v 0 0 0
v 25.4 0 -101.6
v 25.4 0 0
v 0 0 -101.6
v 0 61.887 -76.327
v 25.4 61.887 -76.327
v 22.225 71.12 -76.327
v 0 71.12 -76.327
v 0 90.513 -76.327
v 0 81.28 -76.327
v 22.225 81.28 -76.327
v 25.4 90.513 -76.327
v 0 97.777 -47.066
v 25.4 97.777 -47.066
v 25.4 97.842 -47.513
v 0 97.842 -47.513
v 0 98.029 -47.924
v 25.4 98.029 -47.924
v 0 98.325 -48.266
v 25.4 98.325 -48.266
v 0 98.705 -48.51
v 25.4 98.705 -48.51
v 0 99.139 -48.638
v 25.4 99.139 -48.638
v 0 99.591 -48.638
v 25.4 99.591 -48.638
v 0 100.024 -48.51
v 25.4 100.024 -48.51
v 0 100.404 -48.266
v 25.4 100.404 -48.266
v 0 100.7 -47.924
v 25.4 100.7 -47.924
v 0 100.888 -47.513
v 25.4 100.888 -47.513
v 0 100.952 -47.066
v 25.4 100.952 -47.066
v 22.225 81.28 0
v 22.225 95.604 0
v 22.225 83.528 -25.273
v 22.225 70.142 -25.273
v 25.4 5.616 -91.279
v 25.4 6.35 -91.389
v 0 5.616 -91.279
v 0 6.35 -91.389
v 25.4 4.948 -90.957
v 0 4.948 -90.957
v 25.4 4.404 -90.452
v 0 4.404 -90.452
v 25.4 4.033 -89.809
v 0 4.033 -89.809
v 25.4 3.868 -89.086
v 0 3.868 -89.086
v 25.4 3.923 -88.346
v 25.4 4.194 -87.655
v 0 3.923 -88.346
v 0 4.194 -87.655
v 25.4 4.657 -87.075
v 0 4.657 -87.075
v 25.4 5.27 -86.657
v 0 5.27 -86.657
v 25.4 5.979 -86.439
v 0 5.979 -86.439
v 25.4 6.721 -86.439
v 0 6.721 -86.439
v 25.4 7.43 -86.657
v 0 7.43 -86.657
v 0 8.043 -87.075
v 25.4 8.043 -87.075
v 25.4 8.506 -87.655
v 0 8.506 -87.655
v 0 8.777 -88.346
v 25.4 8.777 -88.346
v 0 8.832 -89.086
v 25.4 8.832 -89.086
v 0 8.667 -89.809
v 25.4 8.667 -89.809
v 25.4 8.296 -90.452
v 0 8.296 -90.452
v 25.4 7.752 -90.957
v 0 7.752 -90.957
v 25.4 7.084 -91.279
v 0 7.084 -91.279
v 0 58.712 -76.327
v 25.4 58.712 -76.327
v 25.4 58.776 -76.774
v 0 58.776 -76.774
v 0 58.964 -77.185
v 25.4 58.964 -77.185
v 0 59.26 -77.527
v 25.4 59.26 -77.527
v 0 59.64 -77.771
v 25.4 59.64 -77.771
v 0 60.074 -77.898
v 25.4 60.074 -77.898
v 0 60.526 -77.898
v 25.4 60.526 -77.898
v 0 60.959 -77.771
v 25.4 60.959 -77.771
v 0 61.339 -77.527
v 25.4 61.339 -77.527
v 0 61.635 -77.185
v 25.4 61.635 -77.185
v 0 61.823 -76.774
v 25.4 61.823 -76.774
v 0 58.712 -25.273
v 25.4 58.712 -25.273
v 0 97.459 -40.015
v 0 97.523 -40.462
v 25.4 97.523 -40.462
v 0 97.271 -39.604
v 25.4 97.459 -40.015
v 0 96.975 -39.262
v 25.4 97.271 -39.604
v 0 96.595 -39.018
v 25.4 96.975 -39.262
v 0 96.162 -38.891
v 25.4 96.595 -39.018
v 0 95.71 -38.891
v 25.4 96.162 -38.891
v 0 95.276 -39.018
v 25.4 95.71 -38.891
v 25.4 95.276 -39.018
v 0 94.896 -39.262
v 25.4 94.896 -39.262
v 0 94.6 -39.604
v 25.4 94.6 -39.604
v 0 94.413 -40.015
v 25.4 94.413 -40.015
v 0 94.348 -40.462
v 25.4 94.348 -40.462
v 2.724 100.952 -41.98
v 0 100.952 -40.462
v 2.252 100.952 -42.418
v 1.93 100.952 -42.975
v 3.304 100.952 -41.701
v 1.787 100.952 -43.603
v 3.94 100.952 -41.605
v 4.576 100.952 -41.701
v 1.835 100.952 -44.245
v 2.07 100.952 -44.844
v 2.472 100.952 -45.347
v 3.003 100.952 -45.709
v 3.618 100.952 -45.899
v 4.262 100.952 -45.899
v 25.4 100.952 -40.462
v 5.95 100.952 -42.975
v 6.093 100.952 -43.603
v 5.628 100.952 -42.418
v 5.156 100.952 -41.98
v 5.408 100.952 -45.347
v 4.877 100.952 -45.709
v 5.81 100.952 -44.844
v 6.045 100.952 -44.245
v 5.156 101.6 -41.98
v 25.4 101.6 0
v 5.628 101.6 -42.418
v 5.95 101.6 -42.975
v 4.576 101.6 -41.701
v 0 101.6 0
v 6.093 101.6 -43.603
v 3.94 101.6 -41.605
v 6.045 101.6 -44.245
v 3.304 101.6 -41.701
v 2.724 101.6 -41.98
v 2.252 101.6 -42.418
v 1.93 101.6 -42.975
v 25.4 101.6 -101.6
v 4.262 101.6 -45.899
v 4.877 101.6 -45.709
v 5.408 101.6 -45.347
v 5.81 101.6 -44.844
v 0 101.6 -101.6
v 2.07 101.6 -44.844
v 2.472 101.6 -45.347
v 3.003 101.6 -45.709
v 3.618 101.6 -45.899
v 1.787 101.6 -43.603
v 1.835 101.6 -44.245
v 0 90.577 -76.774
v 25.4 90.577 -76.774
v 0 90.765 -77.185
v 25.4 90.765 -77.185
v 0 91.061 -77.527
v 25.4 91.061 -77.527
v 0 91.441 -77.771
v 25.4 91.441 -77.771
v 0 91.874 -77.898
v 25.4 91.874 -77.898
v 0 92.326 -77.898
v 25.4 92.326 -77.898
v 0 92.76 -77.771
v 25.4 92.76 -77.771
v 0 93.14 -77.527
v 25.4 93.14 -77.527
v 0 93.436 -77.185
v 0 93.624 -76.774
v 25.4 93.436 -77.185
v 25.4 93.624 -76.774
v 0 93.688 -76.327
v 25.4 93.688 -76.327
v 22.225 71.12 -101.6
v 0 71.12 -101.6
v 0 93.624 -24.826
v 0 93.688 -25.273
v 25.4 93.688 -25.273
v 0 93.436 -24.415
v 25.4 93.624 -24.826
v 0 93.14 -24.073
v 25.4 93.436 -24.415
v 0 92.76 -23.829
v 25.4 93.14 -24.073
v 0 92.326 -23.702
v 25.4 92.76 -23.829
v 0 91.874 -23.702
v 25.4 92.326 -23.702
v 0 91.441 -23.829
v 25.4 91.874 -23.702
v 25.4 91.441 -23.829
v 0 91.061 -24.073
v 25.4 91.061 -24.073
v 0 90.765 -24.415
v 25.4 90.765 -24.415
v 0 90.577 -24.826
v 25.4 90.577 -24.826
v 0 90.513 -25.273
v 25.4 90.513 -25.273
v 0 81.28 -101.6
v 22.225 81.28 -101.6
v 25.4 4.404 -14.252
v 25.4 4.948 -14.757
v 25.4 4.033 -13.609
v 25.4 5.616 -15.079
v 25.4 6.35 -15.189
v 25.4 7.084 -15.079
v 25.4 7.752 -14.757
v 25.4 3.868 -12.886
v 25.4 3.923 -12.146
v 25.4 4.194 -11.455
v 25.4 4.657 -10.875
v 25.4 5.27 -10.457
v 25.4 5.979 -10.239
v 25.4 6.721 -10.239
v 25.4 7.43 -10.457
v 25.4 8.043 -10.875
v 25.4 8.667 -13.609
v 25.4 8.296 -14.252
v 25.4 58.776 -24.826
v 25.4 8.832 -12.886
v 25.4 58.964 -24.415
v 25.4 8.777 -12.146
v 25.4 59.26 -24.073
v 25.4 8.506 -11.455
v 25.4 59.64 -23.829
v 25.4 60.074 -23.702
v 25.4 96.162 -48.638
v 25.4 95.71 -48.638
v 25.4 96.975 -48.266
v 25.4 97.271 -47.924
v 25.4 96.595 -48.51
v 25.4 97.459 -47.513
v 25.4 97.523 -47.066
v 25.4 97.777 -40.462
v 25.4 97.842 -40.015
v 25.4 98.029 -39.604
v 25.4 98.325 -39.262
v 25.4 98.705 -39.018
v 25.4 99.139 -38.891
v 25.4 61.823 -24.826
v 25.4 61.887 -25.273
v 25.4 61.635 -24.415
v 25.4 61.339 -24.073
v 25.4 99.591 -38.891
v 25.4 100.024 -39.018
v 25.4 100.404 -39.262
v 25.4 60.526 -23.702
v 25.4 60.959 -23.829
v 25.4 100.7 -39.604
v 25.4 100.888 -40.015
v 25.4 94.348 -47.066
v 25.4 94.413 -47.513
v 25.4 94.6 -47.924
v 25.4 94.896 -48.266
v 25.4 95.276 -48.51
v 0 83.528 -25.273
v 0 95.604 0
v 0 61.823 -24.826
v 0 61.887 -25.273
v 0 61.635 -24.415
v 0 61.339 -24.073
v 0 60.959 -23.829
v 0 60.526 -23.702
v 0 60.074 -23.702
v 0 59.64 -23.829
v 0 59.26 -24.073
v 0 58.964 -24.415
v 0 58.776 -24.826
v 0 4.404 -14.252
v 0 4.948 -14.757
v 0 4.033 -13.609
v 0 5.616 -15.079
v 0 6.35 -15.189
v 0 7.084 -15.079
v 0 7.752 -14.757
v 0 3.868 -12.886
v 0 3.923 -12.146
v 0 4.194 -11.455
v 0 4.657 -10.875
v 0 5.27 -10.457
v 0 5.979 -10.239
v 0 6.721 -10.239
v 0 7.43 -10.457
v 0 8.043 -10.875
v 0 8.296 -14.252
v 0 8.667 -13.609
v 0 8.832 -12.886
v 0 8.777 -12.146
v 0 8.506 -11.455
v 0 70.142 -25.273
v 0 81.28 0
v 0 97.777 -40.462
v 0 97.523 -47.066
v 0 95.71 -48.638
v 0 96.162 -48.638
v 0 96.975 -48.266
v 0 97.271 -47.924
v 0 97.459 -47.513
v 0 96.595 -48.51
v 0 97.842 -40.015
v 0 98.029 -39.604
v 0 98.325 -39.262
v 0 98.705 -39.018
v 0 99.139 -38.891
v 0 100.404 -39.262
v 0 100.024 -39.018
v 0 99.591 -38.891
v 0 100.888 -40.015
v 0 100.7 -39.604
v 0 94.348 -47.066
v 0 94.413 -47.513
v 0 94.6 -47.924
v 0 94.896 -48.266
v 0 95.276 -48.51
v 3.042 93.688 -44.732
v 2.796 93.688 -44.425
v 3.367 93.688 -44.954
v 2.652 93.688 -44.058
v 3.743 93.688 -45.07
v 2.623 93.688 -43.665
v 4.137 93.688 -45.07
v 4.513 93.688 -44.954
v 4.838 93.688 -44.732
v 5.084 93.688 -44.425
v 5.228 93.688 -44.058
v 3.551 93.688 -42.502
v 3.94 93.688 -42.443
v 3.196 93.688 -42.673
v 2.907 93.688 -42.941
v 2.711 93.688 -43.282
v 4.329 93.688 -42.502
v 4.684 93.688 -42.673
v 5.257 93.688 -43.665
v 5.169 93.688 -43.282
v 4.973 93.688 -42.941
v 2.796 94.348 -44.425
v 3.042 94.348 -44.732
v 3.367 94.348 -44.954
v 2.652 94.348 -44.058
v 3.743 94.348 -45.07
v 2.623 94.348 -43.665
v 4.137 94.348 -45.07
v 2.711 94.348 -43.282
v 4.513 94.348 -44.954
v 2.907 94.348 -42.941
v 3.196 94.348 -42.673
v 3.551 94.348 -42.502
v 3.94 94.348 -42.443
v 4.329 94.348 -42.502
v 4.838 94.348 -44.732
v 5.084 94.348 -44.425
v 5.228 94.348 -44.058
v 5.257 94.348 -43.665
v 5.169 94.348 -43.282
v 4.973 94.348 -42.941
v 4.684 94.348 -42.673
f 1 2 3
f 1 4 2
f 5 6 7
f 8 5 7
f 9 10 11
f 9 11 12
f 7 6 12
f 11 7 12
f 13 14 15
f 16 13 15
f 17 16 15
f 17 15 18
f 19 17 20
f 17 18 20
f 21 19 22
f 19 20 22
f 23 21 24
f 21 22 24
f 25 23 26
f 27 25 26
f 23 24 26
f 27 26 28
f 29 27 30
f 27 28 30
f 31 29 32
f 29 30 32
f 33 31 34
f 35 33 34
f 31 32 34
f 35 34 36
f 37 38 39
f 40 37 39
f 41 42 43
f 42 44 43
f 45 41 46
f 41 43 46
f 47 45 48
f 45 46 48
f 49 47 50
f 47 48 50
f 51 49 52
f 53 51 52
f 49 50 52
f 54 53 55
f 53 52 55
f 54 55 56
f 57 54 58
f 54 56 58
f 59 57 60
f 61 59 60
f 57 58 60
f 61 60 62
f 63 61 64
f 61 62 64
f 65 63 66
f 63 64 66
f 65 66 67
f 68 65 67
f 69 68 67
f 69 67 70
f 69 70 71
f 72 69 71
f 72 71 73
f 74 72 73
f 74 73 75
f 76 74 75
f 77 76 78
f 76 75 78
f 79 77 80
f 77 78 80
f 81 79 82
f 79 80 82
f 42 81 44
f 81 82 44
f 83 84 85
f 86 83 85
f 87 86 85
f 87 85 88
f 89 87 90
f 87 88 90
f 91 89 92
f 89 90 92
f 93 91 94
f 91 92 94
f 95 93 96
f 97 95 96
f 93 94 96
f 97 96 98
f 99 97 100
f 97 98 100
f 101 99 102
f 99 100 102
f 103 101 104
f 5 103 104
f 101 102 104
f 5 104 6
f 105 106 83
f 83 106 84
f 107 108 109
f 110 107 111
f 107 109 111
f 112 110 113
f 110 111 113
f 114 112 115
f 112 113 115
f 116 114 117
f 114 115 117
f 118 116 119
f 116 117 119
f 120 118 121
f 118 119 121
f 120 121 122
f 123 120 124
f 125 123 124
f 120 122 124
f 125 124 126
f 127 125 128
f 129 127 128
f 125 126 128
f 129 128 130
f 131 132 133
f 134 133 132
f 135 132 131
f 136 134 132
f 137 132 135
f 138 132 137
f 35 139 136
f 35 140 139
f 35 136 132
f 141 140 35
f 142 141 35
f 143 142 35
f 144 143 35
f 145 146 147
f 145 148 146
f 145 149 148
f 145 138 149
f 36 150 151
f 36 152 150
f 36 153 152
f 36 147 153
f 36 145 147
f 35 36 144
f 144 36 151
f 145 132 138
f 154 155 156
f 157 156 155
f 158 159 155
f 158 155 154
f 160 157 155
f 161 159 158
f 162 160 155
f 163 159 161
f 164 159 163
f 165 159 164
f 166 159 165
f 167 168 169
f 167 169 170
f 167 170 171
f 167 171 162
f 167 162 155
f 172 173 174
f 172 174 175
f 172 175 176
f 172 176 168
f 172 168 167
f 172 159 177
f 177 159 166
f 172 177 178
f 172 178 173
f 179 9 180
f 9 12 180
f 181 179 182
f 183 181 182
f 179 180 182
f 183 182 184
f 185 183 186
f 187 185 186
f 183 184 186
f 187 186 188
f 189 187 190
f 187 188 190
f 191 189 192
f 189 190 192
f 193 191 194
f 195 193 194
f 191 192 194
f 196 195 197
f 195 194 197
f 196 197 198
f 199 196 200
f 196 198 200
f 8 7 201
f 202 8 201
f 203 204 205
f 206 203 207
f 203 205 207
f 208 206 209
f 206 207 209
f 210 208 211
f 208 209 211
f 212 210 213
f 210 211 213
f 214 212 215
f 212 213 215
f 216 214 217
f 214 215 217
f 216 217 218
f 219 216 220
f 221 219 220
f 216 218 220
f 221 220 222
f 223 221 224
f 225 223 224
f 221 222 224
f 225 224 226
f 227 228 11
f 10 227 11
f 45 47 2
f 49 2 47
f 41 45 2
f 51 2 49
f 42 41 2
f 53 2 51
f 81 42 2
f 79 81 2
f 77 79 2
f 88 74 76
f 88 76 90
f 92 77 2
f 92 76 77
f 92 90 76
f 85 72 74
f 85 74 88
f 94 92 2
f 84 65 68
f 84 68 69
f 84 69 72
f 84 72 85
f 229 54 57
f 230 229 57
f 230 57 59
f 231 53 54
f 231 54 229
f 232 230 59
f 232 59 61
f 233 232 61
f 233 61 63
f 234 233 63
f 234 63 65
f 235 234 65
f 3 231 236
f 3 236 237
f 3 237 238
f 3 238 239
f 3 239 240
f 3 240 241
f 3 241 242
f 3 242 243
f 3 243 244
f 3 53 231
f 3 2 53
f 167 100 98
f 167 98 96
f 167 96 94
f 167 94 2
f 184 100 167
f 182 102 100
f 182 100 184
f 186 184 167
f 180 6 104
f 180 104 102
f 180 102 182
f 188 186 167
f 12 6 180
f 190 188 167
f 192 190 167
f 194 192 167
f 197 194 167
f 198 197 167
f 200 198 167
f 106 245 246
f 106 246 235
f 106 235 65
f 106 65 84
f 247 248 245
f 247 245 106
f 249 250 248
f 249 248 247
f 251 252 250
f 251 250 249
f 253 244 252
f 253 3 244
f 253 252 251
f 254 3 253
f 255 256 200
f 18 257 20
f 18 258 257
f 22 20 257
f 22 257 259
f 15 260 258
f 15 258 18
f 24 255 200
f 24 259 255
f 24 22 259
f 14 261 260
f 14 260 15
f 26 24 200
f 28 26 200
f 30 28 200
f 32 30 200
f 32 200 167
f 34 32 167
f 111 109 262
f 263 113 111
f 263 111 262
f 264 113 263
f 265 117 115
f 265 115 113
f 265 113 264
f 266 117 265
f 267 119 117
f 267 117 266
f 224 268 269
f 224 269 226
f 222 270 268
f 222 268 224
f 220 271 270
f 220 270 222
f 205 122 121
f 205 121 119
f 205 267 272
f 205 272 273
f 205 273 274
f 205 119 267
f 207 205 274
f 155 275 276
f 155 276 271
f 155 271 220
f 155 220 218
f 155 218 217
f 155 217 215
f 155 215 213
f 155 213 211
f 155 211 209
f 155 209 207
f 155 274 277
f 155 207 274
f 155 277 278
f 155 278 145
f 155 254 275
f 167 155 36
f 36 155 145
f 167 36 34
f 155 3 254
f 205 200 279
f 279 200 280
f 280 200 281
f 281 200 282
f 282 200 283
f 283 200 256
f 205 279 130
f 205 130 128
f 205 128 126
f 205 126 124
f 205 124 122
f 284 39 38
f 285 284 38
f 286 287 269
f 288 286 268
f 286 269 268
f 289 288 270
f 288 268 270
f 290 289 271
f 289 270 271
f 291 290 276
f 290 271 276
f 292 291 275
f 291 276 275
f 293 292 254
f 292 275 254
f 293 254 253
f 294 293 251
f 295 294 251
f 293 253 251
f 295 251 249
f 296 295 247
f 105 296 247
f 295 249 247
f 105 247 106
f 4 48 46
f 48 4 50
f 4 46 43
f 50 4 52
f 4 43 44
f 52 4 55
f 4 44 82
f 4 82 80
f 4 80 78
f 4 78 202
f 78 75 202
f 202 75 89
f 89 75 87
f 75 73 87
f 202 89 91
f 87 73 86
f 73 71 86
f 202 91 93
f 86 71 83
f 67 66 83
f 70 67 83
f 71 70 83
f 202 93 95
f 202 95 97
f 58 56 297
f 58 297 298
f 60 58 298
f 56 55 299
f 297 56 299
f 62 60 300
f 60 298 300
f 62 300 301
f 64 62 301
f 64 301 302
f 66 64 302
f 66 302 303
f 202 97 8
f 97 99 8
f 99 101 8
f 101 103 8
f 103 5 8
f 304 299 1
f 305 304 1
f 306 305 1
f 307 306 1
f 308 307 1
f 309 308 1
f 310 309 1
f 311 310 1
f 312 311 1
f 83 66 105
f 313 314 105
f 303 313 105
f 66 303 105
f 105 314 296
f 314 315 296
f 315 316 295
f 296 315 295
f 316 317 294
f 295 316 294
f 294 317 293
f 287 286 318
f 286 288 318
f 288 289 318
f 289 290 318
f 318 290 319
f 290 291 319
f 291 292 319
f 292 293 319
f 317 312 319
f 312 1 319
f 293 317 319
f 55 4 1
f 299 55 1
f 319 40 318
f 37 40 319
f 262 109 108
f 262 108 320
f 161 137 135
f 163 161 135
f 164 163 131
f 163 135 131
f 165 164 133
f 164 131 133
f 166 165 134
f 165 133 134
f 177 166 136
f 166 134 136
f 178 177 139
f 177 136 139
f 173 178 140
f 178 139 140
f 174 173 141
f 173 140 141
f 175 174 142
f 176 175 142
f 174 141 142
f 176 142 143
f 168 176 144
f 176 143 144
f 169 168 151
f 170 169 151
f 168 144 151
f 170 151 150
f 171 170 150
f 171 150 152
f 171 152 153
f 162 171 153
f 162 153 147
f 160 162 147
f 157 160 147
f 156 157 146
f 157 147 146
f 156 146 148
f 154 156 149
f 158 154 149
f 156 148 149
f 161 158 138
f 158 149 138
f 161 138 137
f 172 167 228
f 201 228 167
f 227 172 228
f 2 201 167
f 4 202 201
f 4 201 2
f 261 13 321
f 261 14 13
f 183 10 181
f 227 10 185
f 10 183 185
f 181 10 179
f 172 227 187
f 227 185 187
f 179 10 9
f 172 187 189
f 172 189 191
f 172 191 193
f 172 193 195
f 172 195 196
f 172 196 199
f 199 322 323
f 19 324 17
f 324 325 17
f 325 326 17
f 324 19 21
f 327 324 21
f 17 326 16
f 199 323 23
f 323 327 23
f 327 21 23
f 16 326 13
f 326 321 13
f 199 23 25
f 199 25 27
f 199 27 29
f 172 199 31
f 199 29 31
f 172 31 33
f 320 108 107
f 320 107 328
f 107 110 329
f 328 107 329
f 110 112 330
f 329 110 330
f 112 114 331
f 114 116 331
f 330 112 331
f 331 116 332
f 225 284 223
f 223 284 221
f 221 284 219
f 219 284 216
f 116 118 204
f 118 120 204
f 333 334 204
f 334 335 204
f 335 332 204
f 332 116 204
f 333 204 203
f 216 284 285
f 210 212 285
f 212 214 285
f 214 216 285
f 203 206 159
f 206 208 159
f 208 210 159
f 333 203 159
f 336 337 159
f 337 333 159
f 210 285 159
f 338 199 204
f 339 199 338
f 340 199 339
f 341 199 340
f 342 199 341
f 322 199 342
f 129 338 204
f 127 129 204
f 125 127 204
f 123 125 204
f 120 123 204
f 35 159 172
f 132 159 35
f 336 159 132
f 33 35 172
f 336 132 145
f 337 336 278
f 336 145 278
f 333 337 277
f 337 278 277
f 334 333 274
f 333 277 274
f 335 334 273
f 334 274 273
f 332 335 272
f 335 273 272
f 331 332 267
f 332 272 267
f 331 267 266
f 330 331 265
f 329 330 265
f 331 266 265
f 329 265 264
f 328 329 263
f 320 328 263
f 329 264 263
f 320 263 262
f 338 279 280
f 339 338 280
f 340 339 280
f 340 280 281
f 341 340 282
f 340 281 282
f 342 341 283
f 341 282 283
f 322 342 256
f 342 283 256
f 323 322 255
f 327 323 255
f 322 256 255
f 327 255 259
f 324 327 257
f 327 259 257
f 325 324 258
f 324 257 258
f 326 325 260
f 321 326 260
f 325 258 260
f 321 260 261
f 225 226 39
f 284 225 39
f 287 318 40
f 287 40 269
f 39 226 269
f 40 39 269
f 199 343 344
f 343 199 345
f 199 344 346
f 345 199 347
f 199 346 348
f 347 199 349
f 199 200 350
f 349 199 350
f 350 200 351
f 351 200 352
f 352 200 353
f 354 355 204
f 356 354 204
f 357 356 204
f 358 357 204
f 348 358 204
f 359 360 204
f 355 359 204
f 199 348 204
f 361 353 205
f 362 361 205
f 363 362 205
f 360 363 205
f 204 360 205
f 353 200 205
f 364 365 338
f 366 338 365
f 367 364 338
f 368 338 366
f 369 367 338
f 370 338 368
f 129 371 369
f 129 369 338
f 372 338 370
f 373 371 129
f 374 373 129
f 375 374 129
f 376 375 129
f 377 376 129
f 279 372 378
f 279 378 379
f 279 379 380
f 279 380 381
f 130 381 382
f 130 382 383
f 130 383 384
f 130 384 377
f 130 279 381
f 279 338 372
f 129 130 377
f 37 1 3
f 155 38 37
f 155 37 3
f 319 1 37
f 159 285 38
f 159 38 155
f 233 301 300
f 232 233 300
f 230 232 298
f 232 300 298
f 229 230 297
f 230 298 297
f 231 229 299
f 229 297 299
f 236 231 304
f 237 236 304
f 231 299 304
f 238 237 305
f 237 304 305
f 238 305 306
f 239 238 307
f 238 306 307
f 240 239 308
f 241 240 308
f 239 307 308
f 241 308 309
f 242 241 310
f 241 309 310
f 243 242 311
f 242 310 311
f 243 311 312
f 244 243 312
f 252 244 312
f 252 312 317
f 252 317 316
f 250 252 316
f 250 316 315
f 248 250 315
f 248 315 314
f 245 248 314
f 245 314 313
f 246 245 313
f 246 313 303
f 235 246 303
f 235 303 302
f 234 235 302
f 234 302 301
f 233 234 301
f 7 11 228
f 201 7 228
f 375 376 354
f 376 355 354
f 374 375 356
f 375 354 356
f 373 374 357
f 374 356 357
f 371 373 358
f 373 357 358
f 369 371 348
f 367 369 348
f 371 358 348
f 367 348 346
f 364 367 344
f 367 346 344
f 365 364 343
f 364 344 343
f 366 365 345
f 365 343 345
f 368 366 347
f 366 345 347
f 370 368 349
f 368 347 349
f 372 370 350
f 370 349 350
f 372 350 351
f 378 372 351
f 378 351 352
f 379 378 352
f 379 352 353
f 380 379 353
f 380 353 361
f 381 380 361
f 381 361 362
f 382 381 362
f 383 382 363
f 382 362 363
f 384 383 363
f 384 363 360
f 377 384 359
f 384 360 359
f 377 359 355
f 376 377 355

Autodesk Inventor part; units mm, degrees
ref_plane "YZ Plane" through (0, 0, 0) normal (1, 0, 0) x (0, 1, 0)
ref_plane "XZ Plane" through (0, 0, 0) normal (0, 1, 0) x (-1, 0, 0)
ref_plane "XY Plane" through (0, 0, 0) normal (0, 0, 1) x (1, 0, 0)
sketch "Sketch1" plane through (0, 0, 0) normal (1, 0, 0) x (0, 1, 0)
  line L0 (0, 0) -> (101.6, 0)
  line L1 (101.6, 0) -> (101.6, -101.6)
  line L2 (101.6, -101.6) -> (0, -101.6)
  line L3 (0, -101.6) -> (0, 0)
  dimension "d0" = 101.6
  dimension "d1" = 101.6
extrude "Extrusion1" add sketch "Sketch1" along normal blind 25.4
sketch "Sketch2" plane through (25.4, 0, 0) normal (1, 0, 0) x (0, 0, -1)
  line L0 (0, 101.6) -> (0, 0) projected
  line L1 (0, 0) -> (12.7, 0)
  line L2 (12.7, 0) -> (12.7, 6.35)
  line L3 (12.7, 6.35) -> (0, 6.35)
  line L4 (0, 6.35) -> (0, 0)
  line L5 (101.6, 0) -> (101.6, 101.6) projected
  line L6 (101.6, 0) -> (88.9, 0)
  line L7 (88.9, 0) -> (88.9, 6.35)
  line L8 (88.9, 6.35) -> (101.6, 6.35)
  line L9 (101.6, 6.35) -> (101.6, 0)
  line L10 (101.6, 101.6) -> (0, 101.6) projected
  line L11 (50.8, 101.6) -> (50.8, 76.2)
  line L12 (25.273, 58.7121) -> (76.327, 58.7121)
  line L13 (76.327, 58.7121) -> (76.327, 93.6879)
  line L14 (76.327, 93.6879) -> (25.273, 93.6879)
  line L15 (25.273, 93.6879) -> (25.273, 58.7121)
  line L16 (25.273, 58.7121) -> (76.327, 93.6879) construction
  line L17 (76.327, 58.7121) -> (25.273, 93.6879) construction
  line L18 (74.9076, 71.12) -> (101.6, 71.12)
  line L19 (101.6, 71.12) -> (101.6, 81.28)
  line L20 (101.6, 81.28) -> (74.9076, 81.28)
  line L21 (74.9076, 81.28) -> (74.9076, 71.12)
  line L22 (74.9076, 71.12) -> (101.6, 81.28) construction
  line L23 (101.6, 71.12) -> (74.9076, 81.28) construction
  line L24 (25.273, 93.6879) -> (25.273, 83.5279)
  line L25 (25.273, 58.7121) -> (25.273, 70.1421)
  line L26 (25.273, 70.1421) -> (0, 81.28)
  line L27 (25.273, 83.5279) -> (0, 95.6039)
  line L28 (0, 81.28) -> (0, 95.6039)
  line L29 (25.273, 83.5279) -> (25.273, 70.1421)
  point P0 (88.2538, 76.2)
  point P1 (76.327, 81.28)
  point P2 (76.327, 71.12)
  dimension "d4" = 12.7
  dimension "d5" = 6.35
  dimension "d6" = 12.7
  dimension "d7" = 6.35
  dimension "d8" = 25.4
  dimension "d9" = 51.054
  dimension "d10" = 34.9758
  dimension "d20" = 10.16
  dimension "d21" = 10.16
  dimension "d22" = 11.43
extrude "Extrusion2" cut sketch "Sketch2" against normal blind 25.4 contours L27 L15 L26 L0 | L15 L14 L13 L20 L21 L18 L12 | L5 L18 L13 L20 | L13 L18 L21 L20
hole "Hole1" at (25.4, 6.35, -88.9) at (25.4, 6.35, -12.7) direction (-1, 0, 0) diameter 4.9784 end through all thread size "1/4-20 UNC" class "2B" standard "ANSI Unified Screw Threads"
sketch "Sketch5" plane through (25.4, 0, 0) normal (1, 0, 0) x (0, 0, -1)
  line L0 (0, 101.6) -> (0, 95.6039) projected
  line L1 (25.273, 58.7121) -> (76.327, 58.7121) projected
  line L2 (0, 101.6) -> (25.273, 101.6)
  line L3 (25.273, 101.6) -> (25.273, 58.7121)
  line L4 (25.273, 58.7121) -> (0, 58.7121)
  line L5 (0, 58.7121) -> (0, 101.6)
  line L6 (101.6, 81.28) -> (101.6, 101.6) projected
  line L7 (76.327, 58.7121) -> (101.6, 58.7121)
  line L8 (101.6, 58.7121) -> (101.6, 101.6)
  line L9 (101.6, 101.6) -> (76.327, 101.6)
  line L10 (76.327, 101.6) -> (76.327, 58.7121)
  point P0 (0, 0)
extrude "Extrusion4" add sketch "Sketch5" against normal blind 3.175
sketch "Sketch6" plane through (25.4, 0, 0) normal (1, 0, 0) x (0, 0, -1)
  line L0 (76.327, 93.6879) -> (25.273, 93.6879) projected
  line L1 (50.8, 93.6879) -> (43.7642, 93.6879)
  line L2 (43.7642, 93.6879) -> (43.7642, 97.6503)
  line L3 (101.6, 101.6) -> (0, 101.6) projected
  line L4 (40.4622, 100.9523) -> (47.0662, 100.9523)
  line L5 (47.0662, 100.9523) -> (47.0662, 94.3483)
  line L6 (47.0662, 94.3483) -> (40.4622, 94.3483)
  line L7 (40.4622, 94.3483) -> (40.4622, 100.9523)
  line L8 (40.4622, 100.9523) -> (47.0662, 94.3483) construction
  line L9 (47.0662, 100.9523) -> (40.4622, 94.3483) construction
  point P0 (0, 0)
  dimension "d30" = 7.0358
  dimension "d31" = 3.9624
  dimension "d32" = 6.604
  dimension "d33" = 6.604
extrude "Extrusion5" cut sketch "Sketch6" against normal blind 25.4
sketch "Sketch7" plane through (0, 101.6, 0) normal (0, 1, 0) x (1, 0, 0)
  line L0 (25.4, 40.4622) -> (0, 40.4622) projected
  line L1 (25.4, 47.0662) -> (0, 47.0662) projected
  line L2 (0, 47.0662) -> (0, 43.7642)
  line L3 (0, 101.6) -> (0, 0) projected
  line L4 (0, 43.7642) -> (3.94, 43.7642)
  dimension "d36" = 3.302
  dimension "d37" = 3.94
hole "Hole2" at (3.94, 101.6, -43.7642) direction (0, -1, 0) diameter 4.318 depth 6.35 tip angle 118 clearance for "Socket Head Cap Screw" size "#6" standard "Ansi Unified Screw Threads"
sketch "Sketch8" plane through (25.4, 94.3483, -40.4622) normal (0, 1, 0) x (1, 0, 0)
  point P0 (-25.4, -40.4622)
  point P1 (-21.46, 3.302)
hole "Hole3" at (3.94, 94.3483, -43.7642) direction (0, -1, 0) diameter 2.6416 depth 10.9728 tip angle 118 thread size "6-32 UNC" class "2B" standard "ANSI Unified Screw Threads"
sketch "Sketch9" plane through (25.4, 0, 0) normal (1, 0, 0) x (0, 0, -1)
  line L0 (25.273, 93.6879) -> (76.327, 93.6879) projected
  line L1 (25.273, 93.6879) -> (25.273, 92.1004)
  line L2 (25.273, 58.7121) -> (25.273, 93.6879) projected
  circle A0 centre (25.273, 92.1004) radius 1.5875
  line L3 (25.273, 58.7121) -> (25.273, 60.2996)
  line L4 (76.327, 93.6879) -> (76.327, 92.1004)
  line L5 (76.327, 93.6879) -> (76.327, 58.7121) projected
  line L6 (25.273, 58.7121) -> (76.327, 58.7121) projected
  line L7 (76.327, 58.7121) -> (76.327, 60.2996)
  line L8 (40.4622, 100.9523) -> (40.4622, 94.3483) projected
  line L9 (40.4622, 94.3483) -> (40.4622, 95.9358)
  line L10 (40.4622, 100.9523) -> (40.4622, 99.3648)
  line L11 (47.0662, 100.9523) -> (47.0662, 99.3648)
  line L12 (47.0662, 94.3483) -> (47.0662, 100.9523) projected
  line L13 (47.0662, 94.3483) -> (47.0662, 95.9358)
  circle A1 centre (25.273, 60.2996) radius 1.5875
  circle A2 centre (76.327, 60.2996) radius 1.5875
  circle A3 centre (76.327, 92.1004) radius 1.5875
  circle A4 centre (47.0662, 99.3648) radius 1.5875
  circle A5 centre (47.0662, 95.9358) radius 1.5875
  circle A6 centre (40.4622, 95.9358) radius 1.5875
  circle A7 centre (40.4622, 99.3648) radius 1.5875
  point P0 (0, 0)
  point P1 (76.327, 90.5129)
  point P2 (76.327, 61.8871)
  dimension "d52" = 1.5875
  dimension "d53" = 3.175
  dimension "d54" = 1.5875
  dimension "d55" = 1.5875
  dimension "d56" = 1.5875
  dimension "d57" = 1.5875
  dimension "d58" = 1.5875
  dimension "d59" = 1.5875
  dimension "d60" = 1.5875
  dimension "d61" = 3.175
  dimension "d62" = 3.175
  dimension "d63" = 3.175
  dimension "d64" = 3.175
  dimension "d65" = 3.175
  dimension "d66" = 3.175
  dimension "d67" = 3.175
extrude "Extrusion6" cut sketch "Sketch9" against normal blind 25.4 contours A0 L2 L1 | L1 L2 A0 | A3 L5 L4 | A1 L2 | L2 A1 | A2 L5 | A7 L8 | A6 L8 | L8 A6 | L8 A7 | A4 L12 L11 | A5 L12 | L12 A5 | L11 L12 A4 picked at (76.6743, 93.0931) picked at (76.6743, 59.3069)
properties part number "Al thermal core-r2"
